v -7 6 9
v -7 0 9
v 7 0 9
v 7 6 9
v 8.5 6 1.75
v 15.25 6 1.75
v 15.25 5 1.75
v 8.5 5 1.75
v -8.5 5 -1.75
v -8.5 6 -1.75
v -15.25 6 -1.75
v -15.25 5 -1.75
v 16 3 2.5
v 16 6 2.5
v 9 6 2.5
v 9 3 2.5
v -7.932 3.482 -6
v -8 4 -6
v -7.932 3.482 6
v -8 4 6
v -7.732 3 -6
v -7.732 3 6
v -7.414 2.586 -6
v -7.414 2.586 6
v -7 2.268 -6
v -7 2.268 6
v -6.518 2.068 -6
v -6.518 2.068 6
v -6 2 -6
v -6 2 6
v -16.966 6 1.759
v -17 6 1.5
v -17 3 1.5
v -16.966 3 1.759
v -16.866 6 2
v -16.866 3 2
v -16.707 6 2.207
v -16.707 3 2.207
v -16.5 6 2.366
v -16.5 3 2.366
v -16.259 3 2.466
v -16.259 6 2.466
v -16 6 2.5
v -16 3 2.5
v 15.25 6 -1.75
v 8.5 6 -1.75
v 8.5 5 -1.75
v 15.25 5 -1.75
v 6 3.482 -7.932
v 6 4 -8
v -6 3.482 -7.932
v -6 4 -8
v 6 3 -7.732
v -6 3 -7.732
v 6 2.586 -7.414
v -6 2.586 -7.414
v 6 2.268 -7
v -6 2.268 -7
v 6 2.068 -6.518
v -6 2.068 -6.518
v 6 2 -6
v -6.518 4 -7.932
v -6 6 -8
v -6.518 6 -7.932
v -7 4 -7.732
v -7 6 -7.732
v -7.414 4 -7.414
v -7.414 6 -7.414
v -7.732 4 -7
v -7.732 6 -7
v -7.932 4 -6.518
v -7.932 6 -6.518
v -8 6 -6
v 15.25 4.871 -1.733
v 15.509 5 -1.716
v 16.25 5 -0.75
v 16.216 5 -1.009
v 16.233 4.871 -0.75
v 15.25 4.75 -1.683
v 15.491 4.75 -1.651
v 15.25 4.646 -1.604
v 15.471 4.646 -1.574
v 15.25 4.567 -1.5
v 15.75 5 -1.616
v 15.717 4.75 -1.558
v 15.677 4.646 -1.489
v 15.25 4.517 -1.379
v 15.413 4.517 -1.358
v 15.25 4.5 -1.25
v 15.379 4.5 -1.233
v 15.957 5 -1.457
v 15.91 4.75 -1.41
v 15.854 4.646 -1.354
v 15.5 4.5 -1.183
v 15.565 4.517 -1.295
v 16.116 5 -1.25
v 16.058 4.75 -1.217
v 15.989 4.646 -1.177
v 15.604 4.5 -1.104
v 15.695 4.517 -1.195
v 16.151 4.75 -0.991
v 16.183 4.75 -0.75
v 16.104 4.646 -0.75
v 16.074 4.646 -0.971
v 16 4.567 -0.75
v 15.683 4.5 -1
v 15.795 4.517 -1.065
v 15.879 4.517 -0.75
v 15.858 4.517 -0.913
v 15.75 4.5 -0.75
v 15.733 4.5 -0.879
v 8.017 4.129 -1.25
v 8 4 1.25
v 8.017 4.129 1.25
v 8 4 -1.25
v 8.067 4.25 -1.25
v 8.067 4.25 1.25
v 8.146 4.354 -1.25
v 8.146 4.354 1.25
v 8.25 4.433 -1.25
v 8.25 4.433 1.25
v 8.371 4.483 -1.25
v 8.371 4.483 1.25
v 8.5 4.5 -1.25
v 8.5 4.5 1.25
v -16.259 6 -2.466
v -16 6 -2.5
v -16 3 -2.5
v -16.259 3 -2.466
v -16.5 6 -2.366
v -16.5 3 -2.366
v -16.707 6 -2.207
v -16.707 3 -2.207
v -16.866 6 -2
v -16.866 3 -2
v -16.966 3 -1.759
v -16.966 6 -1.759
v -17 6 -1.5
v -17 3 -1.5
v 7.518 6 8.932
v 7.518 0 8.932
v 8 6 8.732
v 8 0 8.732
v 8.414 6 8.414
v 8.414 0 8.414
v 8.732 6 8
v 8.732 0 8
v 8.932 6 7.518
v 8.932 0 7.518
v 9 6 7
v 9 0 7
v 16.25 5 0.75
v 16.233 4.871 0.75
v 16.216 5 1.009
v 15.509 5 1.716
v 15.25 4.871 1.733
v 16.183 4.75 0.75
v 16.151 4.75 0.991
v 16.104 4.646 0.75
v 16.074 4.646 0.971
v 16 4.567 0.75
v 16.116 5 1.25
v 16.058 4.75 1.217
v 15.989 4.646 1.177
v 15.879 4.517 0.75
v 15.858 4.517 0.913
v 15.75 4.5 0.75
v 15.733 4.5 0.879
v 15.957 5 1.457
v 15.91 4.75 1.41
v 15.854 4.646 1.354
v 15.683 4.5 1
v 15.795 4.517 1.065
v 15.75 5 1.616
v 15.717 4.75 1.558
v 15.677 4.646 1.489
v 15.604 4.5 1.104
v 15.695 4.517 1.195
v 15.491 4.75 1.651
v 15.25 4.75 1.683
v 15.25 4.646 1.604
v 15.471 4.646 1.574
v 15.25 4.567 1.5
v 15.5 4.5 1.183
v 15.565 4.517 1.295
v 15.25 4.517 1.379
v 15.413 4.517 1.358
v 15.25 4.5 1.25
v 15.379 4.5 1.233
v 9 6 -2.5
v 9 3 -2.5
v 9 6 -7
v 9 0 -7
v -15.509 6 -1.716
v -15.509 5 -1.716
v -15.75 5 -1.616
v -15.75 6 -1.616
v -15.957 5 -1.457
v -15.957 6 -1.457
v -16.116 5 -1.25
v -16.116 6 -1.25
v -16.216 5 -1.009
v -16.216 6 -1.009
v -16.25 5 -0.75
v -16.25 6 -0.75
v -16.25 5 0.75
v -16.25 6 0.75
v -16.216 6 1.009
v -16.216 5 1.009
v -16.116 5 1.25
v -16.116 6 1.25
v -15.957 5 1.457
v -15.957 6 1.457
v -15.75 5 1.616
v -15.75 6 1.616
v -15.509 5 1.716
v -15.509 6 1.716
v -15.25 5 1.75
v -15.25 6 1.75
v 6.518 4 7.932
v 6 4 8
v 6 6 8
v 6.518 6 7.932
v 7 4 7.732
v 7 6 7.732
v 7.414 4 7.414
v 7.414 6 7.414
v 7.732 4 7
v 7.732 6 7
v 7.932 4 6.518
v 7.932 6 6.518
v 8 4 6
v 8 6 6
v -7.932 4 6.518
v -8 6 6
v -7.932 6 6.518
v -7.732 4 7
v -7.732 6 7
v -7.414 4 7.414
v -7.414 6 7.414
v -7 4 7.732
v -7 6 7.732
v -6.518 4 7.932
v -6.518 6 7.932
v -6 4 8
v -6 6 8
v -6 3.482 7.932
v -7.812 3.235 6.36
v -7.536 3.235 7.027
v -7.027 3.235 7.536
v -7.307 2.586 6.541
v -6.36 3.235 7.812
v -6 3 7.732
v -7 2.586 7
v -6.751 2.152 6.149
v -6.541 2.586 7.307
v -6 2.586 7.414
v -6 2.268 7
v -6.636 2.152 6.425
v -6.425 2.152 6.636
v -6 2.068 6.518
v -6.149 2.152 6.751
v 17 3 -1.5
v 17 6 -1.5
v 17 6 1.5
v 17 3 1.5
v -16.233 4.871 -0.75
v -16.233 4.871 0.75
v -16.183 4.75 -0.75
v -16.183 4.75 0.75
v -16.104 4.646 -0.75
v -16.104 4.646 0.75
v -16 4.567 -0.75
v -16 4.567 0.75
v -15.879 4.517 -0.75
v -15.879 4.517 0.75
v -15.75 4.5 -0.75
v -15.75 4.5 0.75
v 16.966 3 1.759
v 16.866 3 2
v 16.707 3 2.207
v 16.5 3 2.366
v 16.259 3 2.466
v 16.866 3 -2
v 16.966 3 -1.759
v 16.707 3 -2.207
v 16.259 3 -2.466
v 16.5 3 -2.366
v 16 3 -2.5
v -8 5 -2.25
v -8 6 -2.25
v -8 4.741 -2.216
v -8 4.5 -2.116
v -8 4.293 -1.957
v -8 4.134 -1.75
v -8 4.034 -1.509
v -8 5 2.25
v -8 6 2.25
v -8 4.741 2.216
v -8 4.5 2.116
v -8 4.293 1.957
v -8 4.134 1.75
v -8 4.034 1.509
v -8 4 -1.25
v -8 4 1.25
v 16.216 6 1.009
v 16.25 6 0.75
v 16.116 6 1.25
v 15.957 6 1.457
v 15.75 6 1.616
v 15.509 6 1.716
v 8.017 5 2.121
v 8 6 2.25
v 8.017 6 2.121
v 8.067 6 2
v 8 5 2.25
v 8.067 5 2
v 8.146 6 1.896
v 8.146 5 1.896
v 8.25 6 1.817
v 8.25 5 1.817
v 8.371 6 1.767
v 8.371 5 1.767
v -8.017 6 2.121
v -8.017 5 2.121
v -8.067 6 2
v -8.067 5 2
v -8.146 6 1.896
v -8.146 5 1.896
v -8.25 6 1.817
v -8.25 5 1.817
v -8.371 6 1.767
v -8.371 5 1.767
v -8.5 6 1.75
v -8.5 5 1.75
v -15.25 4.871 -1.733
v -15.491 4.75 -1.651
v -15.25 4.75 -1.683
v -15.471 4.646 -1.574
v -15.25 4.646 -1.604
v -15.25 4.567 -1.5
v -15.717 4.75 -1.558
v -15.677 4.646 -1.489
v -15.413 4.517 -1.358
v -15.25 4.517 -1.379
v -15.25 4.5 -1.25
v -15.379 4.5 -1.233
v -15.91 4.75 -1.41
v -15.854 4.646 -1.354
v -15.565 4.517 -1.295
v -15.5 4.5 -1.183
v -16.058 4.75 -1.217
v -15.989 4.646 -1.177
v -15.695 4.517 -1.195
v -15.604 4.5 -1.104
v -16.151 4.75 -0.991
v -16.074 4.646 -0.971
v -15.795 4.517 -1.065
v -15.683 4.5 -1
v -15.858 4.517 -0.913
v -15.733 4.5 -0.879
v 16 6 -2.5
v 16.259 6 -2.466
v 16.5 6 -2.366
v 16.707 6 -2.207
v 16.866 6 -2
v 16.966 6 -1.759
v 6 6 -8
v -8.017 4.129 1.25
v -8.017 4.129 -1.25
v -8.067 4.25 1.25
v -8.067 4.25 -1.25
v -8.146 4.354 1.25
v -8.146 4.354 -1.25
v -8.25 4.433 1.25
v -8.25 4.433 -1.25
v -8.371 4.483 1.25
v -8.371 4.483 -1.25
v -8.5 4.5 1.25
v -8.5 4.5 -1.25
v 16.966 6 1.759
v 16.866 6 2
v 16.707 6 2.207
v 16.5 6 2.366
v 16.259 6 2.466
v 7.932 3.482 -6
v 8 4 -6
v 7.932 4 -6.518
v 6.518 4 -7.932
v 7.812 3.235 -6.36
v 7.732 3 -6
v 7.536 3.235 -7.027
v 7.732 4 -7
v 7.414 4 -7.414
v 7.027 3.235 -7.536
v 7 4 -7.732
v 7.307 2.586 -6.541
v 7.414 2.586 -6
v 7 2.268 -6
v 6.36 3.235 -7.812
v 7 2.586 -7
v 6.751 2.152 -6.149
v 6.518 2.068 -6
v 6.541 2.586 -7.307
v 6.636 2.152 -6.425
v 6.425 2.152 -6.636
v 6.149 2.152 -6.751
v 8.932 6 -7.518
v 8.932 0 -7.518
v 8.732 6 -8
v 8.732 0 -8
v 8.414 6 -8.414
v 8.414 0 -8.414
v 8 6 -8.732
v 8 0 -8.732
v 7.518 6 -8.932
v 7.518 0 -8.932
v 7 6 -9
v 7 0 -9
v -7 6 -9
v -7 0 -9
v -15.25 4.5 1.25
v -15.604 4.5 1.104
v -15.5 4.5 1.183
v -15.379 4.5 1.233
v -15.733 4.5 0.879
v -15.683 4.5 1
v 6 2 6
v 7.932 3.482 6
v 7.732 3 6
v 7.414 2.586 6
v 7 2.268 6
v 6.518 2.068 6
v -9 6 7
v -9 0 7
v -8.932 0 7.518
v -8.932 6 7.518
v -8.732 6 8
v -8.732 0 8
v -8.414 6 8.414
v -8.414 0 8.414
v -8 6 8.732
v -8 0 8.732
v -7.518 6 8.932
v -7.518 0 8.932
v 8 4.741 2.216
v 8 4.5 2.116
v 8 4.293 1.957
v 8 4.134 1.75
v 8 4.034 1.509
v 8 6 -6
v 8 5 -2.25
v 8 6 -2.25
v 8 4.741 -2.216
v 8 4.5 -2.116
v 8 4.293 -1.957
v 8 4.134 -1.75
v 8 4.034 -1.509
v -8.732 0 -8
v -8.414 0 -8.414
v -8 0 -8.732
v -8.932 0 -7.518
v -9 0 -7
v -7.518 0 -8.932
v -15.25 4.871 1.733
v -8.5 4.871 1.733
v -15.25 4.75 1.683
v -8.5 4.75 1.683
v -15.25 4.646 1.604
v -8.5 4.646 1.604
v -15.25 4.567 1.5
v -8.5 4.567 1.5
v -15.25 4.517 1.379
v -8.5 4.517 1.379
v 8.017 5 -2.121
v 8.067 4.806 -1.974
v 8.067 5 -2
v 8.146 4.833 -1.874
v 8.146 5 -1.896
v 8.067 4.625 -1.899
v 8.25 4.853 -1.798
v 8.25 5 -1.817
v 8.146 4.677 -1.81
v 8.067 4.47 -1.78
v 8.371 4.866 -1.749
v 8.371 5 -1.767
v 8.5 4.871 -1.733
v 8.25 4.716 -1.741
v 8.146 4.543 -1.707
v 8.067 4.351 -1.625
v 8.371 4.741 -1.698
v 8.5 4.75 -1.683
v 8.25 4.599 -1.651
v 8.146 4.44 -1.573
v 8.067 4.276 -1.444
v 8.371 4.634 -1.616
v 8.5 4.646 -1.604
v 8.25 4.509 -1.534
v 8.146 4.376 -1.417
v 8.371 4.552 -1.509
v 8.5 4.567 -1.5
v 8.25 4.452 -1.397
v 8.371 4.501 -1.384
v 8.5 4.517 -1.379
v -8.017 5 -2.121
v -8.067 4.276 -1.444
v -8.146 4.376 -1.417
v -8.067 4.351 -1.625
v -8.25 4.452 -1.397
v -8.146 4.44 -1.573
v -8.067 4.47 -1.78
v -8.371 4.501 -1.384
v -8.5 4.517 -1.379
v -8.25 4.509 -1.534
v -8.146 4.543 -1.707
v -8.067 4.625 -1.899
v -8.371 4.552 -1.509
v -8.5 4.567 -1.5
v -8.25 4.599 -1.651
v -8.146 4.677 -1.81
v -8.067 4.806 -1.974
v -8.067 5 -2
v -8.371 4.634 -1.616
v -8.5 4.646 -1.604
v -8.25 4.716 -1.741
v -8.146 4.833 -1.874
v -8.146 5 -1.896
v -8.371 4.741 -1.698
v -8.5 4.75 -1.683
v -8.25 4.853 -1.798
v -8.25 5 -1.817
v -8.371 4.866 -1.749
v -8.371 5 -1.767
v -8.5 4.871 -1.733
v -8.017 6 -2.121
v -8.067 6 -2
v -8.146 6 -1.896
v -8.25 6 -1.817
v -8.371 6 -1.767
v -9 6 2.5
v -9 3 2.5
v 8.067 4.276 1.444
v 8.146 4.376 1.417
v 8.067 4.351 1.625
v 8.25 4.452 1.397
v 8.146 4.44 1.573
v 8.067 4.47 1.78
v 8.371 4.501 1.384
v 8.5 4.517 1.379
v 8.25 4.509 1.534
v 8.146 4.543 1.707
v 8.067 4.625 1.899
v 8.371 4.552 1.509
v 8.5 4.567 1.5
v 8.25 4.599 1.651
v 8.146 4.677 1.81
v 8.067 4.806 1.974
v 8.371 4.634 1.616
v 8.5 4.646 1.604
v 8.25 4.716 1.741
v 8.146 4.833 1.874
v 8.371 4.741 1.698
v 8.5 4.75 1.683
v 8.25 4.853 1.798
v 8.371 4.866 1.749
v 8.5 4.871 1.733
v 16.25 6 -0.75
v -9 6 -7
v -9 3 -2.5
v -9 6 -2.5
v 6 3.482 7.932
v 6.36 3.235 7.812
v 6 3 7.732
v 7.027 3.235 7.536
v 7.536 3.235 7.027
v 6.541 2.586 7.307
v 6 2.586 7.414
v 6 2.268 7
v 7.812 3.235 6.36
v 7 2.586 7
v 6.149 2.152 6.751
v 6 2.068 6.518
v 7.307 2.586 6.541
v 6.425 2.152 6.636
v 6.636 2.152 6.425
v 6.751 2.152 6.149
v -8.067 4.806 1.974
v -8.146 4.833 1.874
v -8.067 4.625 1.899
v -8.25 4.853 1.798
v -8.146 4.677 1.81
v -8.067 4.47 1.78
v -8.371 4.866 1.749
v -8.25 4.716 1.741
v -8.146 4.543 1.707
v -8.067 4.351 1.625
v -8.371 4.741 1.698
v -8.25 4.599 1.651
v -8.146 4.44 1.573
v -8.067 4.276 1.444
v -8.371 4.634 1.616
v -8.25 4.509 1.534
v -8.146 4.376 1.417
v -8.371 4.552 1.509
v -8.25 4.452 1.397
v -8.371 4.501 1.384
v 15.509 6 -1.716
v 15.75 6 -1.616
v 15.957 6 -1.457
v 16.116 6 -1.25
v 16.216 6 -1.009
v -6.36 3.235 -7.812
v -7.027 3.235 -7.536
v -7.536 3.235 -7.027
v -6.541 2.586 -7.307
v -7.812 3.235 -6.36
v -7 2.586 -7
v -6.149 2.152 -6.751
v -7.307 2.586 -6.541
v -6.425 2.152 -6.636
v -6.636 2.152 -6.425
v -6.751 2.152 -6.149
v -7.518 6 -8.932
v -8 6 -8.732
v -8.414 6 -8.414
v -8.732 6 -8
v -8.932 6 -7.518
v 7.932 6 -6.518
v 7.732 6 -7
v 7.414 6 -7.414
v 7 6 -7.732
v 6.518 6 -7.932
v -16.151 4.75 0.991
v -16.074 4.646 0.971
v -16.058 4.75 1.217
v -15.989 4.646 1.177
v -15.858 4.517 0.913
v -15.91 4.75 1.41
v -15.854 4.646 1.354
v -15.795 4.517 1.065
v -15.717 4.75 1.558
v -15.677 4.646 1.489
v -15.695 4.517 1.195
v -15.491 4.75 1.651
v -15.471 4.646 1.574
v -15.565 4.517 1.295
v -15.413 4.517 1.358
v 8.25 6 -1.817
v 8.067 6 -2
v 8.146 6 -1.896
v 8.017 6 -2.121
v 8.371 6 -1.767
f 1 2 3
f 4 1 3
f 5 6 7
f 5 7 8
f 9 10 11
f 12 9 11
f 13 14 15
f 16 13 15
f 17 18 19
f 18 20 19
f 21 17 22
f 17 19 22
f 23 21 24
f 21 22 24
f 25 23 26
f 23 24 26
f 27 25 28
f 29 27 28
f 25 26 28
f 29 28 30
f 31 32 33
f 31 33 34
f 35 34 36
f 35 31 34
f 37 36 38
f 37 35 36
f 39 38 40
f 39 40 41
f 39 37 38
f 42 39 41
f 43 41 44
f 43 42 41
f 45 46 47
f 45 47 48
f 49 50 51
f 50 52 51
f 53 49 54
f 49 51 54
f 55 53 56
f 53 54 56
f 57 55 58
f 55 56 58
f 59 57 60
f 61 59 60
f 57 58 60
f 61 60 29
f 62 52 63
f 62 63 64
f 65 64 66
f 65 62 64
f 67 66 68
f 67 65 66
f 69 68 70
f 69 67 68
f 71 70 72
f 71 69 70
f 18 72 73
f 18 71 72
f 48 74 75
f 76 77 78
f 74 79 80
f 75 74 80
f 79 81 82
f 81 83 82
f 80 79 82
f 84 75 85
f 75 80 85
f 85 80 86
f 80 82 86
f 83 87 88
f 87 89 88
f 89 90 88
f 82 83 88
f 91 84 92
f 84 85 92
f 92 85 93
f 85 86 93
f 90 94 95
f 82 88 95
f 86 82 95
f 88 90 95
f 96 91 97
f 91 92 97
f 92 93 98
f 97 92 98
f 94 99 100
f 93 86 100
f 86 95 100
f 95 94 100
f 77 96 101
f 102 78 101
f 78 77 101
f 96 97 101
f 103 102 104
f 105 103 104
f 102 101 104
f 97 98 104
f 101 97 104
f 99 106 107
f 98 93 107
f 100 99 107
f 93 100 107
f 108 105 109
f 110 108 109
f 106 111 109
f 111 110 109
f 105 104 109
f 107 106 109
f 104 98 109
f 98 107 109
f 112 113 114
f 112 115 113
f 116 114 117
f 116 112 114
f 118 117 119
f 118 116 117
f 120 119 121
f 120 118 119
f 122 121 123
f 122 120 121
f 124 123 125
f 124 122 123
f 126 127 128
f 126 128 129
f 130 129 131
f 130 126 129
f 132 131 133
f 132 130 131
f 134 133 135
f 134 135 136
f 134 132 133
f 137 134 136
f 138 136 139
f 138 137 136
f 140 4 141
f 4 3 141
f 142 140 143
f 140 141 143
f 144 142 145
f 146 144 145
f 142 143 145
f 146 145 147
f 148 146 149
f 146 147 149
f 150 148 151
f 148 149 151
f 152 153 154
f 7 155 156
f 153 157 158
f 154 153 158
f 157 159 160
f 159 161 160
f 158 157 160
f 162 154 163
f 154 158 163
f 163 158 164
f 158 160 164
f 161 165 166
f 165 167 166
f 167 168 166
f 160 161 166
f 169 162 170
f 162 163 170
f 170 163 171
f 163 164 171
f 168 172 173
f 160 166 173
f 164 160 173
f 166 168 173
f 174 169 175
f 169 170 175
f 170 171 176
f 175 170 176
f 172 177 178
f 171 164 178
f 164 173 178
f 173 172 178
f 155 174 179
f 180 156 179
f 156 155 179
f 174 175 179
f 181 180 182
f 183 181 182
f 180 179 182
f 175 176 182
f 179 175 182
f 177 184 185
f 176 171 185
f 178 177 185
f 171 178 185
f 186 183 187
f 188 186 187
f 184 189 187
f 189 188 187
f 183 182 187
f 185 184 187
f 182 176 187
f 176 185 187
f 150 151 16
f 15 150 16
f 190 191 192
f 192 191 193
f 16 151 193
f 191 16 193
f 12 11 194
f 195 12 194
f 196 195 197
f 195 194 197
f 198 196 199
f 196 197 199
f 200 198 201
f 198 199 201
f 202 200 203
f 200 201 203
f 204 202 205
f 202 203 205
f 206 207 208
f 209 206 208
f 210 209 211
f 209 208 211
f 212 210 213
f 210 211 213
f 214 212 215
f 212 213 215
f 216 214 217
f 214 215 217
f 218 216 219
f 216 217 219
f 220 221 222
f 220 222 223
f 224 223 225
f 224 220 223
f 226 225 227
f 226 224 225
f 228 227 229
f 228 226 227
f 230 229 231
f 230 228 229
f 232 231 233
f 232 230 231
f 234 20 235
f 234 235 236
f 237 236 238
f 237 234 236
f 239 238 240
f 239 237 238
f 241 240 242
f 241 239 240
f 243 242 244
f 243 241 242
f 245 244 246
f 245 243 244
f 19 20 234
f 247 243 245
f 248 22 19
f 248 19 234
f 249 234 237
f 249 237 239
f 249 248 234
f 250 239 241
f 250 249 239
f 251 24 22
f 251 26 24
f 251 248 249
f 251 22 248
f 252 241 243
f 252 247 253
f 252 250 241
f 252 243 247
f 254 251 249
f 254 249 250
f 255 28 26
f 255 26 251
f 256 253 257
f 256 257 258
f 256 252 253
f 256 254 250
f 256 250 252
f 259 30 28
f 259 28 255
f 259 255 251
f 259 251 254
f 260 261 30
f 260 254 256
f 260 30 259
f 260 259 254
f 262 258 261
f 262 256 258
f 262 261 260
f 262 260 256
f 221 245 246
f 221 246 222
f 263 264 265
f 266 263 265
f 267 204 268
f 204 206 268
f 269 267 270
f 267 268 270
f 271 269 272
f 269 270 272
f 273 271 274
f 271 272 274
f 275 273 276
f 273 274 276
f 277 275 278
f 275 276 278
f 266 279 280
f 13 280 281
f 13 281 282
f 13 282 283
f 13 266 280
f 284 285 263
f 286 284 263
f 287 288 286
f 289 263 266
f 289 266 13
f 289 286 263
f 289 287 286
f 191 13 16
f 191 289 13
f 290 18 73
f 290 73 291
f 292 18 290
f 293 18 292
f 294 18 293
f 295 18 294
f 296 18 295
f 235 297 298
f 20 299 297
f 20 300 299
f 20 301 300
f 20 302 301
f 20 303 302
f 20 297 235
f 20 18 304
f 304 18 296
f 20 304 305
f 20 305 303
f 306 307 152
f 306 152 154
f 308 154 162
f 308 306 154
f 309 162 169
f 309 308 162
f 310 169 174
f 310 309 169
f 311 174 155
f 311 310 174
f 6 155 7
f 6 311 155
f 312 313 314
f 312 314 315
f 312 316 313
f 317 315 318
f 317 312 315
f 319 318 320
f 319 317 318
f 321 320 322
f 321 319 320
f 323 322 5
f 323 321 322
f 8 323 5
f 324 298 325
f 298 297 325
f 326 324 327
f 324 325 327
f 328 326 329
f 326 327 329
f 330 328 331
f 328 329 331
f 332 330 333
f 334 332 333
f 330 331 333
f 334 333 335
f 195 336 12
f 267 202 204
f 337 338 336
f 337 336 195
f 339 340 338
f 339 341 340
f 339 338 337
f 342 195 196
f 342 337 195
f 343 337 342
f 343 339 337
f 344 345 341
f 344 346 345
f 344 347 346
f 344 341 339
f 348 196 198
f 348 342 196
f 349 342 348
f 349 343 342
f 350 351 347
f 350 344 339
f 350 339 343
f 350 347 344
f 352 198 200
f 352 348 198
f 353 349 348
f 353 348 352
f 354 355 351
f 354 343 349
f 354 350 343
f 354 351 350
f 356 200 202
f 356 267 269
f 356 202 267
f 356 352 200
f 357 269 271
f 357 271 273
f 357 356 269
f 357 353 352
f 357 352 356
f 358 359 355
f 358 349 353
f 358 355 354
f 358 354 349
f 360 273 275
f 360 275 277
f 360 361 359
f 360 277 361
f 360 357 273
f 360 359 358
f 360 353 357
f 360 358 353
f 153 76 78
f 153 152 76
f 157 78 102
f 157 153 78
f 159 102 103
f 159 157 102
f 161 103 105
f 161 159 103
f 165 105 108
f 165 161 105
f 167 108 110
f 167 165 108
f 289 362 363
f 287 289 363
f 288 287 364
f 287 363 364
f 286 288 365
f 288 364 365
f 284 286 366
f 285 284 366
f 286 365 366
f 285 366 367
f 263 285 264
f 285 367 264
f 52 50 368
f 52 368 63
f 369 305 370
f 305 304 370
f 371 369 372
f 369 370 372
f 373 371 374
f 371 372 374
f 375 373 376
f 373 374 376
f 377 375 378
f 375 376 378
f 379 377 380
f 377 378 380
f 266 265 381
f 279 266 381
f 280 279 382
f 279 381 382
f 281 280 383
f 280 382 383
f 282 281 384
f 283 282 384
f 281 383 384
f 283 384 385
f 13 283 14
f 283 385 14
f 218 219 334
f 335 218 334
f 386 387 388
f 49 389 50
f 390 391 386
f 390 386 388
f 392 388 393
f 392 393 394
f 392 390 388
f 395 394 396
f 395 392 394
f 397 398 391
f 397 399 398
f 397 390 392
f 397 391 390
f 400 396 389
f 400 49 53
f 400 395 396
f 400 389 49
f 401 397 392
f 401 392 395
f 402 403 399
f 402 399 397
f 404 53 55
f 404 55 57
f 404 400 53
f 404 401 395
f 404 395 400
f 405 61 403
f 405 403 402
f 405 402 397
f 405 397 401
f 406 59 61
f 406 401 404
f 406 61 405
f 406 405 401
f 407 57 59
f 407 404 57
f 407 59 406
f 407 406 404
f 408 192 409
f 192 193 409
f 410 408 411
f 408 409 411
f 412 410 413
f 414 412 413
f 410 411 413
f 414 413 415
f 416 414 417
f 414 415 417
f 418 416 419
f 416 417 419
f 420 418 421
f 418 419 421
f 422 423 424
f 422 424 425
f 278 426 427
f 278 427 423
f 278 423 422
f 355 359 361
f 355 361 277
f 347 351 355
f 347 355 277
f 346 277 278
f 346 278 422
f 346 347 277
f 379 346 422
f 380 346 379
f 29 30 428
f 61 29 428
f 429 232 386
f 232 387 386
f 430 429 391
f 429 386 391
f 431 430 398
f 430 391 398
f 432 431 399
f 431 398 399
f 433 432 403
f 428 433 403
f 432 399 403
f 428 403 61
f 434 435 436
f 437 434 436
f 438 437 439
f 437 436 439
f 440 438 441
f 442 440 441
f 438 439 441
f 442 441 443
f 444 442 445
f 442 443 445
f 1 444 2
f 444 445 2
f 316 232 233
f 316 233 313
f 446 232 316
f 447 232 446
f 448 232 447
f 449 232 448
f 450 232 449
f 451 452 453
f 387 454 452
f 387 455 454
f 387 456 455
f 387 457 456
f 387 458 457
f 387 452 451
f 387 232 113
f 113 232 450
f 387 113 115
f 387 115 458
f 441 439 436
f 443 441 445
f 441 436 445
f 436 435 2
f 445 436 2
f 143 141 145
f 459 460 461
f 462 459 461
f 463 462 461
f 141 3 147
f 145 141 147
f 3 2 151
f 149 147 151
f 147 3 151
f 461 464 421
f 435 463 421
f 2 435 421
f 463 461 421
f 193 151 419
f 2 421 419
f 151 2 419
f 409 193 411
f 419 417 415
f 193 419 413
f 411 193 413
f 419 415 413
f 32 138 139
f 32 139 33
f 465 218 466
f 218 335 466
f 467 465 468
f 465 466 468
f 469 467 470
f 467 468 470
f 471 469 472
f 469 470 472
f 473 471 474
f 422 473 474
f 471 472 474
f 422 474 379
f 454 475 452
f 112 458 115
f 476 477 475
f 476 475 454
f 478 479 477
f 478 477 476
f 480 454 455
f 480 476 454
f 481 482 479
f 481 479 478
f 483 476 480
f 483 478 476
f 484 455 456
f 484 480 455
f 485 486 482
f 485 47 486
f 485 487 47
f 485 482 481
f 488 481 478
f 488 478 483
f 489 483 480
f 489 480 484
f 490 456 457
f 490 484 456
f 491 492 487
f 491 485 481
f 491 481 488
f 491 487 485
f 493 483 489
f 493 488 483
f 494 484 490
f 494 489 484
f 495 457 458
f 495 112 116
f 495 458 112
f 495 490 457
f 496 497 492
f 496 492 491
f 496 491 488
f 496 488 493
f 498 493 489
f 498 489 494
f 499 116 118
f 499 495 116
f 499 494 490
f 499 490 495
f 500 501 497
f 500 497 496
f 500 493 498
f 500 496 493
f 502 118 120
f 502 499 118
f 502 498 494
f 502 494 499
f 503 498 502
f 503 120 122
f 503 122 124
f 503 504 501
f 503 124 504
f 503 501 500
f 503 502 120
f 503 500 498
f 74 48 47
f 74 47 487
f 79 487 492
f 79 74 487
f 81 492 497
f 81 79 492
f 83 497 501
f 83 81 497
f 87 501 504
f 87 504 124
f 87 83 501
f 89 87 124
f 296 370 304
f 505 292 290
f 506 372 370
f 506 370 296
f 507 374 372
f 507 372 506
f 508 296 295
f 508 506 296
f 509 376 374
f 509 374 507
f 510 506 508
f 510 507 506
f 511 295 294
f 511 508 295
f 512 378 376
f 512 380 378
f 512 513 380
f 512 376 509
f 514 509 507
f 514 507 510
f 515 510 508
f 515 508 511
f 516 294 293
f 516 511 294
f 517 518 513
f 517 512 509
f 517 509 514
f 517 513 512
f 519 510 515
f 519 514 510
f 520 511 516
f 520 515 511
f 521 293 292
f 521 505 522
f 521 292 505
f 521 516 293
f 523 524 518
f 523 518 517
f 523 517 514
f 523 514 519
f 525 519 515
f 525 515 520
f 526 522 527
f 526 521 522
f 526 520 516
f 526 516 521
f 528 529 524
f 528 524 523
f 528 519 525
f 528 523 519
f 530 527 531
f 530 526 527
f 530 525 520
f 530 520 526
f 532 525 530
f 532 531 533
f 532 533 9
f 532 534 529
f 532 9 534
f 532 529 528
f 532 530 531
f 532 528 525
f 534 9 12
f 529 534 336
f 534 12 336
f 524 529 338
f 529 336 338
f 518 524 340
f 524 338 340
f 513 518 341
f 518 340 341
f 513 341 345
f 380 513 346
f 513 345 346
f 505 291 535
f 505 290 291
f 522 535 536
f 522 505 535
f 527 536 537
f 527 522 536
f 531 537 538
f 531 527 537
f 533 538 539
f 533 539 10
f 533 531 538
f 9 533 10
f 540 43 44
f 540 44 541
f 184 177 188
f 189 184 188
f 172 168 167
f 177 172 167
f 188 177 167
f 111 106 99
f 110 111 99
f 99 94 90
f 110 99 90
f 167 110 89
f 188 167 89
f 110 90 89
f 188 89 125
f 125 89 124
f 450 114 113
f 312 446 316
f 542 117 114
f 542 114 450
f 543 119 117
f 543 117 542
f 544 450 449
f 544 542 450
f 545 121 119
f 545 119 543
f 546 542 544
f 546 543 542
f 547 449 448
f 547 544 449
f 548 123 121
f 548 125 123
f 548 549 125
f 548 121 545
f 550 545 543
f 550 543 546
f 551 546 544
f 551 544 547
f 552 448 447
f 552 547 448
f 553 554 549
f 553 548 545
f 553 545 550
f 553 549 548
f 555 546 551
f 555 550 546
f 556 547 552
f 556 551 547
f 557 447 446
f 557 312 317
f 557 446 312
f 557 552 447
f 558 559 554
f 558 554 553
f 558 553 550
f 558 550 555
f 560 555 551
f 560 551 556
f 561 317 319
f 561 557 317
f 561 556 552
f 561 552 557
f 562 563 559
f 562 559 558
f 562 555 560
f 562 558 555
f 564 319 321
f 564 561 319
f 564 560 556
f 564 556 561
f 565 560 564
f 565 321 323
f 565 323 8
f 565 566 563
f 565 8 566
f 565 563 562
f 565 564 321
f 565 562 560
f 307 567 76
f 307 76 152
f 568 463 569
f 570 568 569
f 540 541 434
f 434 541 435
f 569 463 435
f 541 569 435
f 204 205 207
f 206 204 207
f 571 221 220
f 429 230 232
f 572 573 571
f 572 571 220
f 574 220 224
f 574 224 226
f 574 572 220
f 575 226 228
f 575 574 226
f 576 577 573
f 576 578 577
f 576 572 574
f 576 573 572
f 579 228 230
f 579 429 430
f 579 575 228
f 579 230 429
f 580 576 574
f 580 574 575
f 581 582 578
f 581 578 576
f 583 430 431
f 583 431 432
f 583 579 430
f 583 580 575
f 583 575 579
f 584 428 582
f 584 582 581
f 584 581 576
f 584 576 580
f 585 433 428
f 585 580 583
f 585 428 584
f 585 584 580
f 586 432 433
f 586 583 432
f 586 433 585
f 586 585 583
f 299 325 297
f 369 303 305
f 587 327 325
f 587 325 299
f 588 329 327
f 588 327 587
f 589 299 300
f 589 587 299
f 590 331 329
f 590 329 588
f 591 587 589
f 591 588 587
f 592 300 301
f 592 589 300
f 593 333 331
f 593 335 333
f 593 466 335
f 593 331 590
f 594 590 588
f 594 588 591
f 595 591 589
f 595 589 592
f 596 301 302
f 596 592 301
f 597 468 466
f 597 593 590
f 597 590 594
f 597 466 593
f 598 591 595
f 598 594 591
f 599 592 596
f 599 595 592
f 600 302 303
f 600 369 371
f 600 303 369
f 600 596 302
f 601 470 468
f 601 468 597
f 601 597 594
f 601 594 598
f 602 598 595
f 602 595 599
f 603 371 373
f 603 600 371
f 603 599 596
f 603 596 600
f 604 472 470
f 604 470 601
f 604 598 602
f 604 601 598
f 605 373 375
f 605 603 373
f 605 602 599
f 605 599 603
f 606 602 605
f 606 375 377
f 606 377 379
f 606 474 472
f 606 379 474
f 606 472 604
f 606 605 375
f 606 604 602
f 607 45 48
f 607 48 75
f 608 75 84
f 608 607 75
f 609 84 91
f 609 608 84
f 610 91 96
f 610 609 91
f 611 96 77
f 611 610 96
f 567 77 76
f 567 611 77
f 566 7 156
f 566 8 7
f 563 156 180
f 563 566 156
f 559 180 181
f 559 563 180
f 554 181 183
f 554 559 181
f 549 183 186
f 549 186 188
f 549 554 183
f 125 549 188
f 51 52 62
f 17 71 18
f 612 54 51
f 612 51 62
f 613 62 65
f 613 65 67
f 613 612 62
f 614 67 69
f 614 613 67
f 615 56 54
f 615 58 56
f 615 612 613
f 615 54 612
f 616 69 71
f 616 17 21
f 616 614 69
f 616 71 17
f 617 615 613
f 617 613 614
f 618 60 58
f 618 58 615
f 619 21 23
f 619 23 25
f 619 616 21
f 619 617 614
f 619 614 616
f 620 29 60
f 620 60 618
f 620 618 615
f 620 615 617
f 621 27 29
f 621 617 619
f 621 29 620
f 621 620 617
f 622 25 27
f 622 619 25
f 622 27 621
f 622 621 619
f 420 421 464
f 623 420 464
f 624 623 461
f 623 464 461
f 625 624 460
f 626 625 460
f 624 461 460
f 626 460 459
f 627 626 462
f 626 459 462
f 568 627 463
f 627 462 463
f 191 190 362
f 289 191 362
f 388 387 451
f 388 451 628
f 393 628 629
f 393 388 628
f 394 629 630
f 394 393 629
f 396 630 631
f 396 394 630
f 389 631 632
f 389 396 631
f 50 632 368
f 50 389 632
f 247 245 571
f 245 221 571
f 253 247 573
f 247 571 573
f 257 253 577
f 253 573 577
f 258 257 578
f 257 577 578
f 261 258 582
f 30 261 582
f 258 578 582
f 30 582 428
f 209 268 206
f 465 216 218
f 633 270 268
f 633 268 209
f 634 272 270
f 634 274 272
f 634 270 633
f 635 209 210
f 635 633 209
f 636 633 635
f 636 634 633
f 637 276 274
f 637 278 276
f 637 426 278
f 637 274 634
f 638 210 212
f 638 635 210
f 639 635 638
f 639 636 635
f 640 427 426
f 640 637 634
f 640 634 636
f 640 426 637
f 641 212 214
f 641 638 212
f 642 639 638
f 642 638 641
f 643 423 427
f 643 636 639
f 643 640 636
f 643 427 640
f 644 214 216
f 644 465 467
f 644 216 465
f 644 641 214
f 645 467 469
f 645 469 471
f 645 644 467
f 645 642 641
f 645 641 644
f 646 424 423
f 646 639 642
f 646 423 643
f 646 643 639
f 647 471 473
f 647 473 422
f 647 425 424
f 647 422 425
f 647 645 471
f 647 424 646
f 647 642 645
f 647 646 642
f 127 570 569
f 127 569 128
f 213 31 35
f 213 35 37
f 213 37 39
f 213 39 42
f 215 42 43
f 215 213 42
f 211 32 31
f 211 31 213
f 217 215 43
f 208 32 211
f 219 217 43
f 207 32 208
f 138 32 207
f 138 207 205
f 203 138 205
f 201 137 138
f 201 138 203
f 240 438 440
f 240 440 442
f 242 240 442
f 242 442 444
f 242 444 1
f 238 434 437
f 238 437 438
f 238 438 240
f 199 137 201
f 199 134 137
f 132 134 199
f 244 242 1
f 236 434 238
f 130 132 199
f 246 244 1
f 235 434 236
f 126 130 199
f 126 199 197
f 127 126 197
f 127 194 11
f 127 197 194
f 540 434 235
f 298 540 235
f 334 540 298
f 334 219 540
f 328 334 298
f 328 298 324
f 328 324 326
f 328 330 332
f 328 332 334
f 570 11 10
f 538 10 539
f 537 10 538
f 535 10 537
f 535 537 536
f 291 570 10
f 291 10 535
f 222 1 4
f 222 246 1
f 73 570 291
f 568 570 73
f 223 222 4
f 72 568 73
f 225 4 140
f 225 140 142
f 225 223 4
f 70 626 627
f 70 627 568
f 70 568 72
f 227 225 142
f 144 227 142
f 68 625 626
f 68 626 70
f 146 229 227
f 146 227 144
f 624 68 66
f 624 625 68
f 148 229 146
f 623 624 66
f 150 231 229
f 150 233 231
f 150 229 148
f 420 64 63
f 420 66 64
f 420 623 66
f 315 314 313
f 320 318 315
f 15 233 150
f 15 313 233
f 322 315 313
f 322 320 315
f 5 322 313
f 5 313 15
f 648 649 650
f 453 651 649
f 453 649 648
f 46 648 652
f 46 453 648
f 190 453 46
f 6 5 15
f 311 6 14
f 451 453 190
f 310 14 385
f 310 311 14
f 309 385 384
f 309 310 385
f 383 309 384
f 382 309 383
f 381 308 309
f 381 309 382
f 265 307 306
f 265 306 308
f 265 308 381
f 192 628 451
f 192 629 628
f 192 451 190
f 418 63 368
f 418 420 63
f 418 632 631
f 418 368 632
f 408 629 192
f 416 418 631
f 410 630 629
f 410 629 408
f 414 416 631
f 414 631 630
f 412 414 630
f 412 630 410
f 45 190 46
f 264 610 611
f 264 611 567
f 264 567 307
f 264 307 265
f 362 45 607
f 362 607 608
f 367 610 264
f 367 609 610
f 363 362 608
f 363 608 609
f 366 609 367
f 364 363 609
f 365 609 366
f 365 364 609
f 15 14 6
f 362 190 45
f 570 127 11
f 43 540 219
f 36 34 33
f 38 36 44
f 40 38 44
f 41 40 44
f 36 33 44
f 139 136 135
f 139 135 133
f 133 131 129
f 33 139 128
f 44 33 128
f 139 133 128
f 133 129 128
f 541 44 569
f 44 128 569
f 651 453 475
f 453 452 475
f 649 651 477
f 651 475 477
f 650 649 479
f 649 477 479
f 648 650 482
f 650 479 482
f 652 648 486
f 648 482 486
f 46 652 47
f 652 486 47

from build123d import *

# Parameters (mm, degrees)
BOSS_EXTRUDE1_DEPTH = 2
BOSS_EXTRUDE2_DEPTH = 4
FILLET1_R           = 2
BOSS_EXTRUDE3_DEPTH = 3
CUT_EXTRUDE1_DEPTH  = 1.5
FILLET2_R           = 0.5


with BuildPart() as part:
    # Sketch1 → Boss-Extrude1 (new body)
    with BuildSketch(Plane(origin=(0, 0, 0), x_dir=(1, 0, 0), z_dir=(0, 1, 0))):
        with BuildLine():
            Line((-7, -9), (7, -9))
            ThreePointArc((7, -9), (8.414213562, -8.414213562), (9, -7))
            Line((9, -7), (9, 7))
            ThreePointArc((9, 7), (8.414213562, 8.414213562), (7, 9))
            Line((7, 9), (-7, 9))
            ThreePointArc((-7, 9), (-8.414213562, 8.414213562), (-9, 7))
            Line((-9, 7), (-9, -7))
            ThreePointArc((-9, -7), (-8.414213562, -8.414213562), (-7, -9))
        make_face()
    extrude(amount=BOSS_EXTRUDE1_DEPTH)

    # Sketch2 → Boss-Extrude2 (add)
    with BuildSketch(Plane(origin=(0, 2, 0), x_dir=(1, 0, 0), z_dir=(0, 1, 0))):
        with BuildLine():
            Line((-7, -9), (7, -9))
            ThreePointArc((7, -9), (8.414213562, -8.414213562), (9, -7))
            Line((9, -7), (9, 7))
            ThreePointArc((9, 7), (8.414213562, 8.414213562), (7, 9))
            Line((7, 9), (-7, 9))
            ThreePointArc((-7, 9), (-8.414213562, 8.414213562), (-9, 7))
            Line((-9, 7), (-9, -7))
            ThreePointArc((-9, -7), (-8.414213562, -8.414213562), (-7, -9))
        make_face()
        with BuildLine():
            Line((-6, -8), (6, -8))
            ThreePointArc((6, -8), (7.414213562, -7.414213562), (8, -6))
            Line((8, -6), (8, 6))
            ThreePointArc((8, 6), (7.414213562, 7.414213562), (6, 8))
            Line((6, 8), (-6, 8))
            ThreePointArc((-6, 8), (-7.414213562, 7.414213562), (-8, 6))
            Line((-8, 6), (-8, -6))
            ThreePointArc((-8, -6), (-7.414213562, -7.414213562), (-6, -8))
        make_face(mode=Mode.SUBTRACT)
    extrude(amount=BOSS_EXTRUDE2_DEPTH)

    # Fillet1
    fillet1_edges = [part.edges().sort_by_distance(p)[0] for p in [
        (-7.414213562, 2, 7.414213562),
        (0, 2, 8),
        (7.414213562, 2, 7.414213562),
        (8, 2, 0),
        (7.414213562, 2, -7.414213562),
        (0, 2, -8),
        (-7.414213562, 2, -7.414213562),
        (-8, 2, 0),
    ]]
    fillet(fillet1_edges, radius=FILLET1_R)

    # Sketch3 → Boss-Extrude3 (add)
    with BuildSketch(Plane(origin=(0, 6, 0), x_dir=(1, 0, 0), z_dir=(0, 1, 0))):
        with BuildLine():
            Line((-9, 2.5), (-16, 2.5))
            ThreePointArc((-16, 2.5), (-16.707106781, 2.207106781), (-17, 1.5))
            Line((-17, 1.5), (-17, -1.5))
            ThreePointArc((-17, -1.5), (-16.707106781, -2.207106781), (-16, -2.5))
            Line((-16, -2.5), (-9, -2.5))
            Line((-9, -2.5), (-9, 2.5))
        make_face()
        with BuildLine():
            Line((9, 2.5), (16, 2.5))
            ThreePointArc((16, 2.5), (16.707106781, 2.207106781), (17, 1.5))
            Line((17, 1.5), (17, -1.5))
            ThreePointArc((17, -1.5), (16.707106781, -2.207106781), (16, -2.5))
            Line((16, -2.5), (9, -2.5))
            Line((9, -2.5), (9, 2.5))
        make_face()
    extrude(amount=-BOSS_EXTRUDE3_DEPTH)

    # Sketch4 → Cut-Extrude1 (cut)
    with BuildSketch(Plane(origin=(0, 6, 0), x_dir=(1, 0, 0), z_dir=(0, 1, 0))):
        with BuildLine():
            Line((-8, 1.75), (-15.25, 1.75))
            ThreePointArc((-15.25, 1.75), (-15.957106781, 1.457106781), (-16.25, 0.75))
            Line((-16.25, 0.75), (-16.25, -0.75))
            ThreePointArc((-16.25, -0.75), (-15.957106781, -1.457106781), (-15.25, -1.75))
            Line((-15.25, -1.75), (-8, -1.75))
            Line((-8, -1.75), (-8, 1.75))
        make_face()
        with BuildLine():
            Line((8, 1.75), (15.25, 1.75))
            ThreePointArc((15.25, 1.75), (15.957106781, 1.457106781), (16.25, 0.75))
            Line((16.25, 0.75), (16.25, -0.75))
            ThreePointArc((16.25, -0.75), (15.957106781, -1.457106781), (15.25, -1.75))
            Line((15.25, -1.75), (8, -1.75))
            Line((8, -1.75), (8, 1.75))
        make_face()
    extrude(amount=-CUT_EXTRUDE1_DEPTH, mode=Mode.SUBTRACT)

    # Fillet2
    fillet2_edges = [part.edges().sort_by_distance(p)[0] for p in [
        (-8, 4.5, 0),
        (-8, 5.25, -1.75),
        (-11.625, 4.5, 1.75),
        (-8, 5.25, 1.75),
        (-15.957106781, 4.5, 1.457106781),
        (-16.25, 4.5, 0),
        (-15.957106781, 4.5, -1.457106781),
        (-11.625, 4.5, -1.75),
        (8, 4.5, 0),
        (8, 5.25, 1.75),
        (11.625, 4.5, -1.75),
        (8, 5.25, -1.75),
        (15.957106781, 4.5, -1.457106781),
        (16.25, 4.5, 0),
        (15.957106781, 4.5, 1.457106781),
        (11.625, 4.5, 1.75),
    ]]
    fillet(fillet2_edges, radius=FILLET2_R - 0.0001)  # a hair under: the kernel refuses the full size


solid = part.part
